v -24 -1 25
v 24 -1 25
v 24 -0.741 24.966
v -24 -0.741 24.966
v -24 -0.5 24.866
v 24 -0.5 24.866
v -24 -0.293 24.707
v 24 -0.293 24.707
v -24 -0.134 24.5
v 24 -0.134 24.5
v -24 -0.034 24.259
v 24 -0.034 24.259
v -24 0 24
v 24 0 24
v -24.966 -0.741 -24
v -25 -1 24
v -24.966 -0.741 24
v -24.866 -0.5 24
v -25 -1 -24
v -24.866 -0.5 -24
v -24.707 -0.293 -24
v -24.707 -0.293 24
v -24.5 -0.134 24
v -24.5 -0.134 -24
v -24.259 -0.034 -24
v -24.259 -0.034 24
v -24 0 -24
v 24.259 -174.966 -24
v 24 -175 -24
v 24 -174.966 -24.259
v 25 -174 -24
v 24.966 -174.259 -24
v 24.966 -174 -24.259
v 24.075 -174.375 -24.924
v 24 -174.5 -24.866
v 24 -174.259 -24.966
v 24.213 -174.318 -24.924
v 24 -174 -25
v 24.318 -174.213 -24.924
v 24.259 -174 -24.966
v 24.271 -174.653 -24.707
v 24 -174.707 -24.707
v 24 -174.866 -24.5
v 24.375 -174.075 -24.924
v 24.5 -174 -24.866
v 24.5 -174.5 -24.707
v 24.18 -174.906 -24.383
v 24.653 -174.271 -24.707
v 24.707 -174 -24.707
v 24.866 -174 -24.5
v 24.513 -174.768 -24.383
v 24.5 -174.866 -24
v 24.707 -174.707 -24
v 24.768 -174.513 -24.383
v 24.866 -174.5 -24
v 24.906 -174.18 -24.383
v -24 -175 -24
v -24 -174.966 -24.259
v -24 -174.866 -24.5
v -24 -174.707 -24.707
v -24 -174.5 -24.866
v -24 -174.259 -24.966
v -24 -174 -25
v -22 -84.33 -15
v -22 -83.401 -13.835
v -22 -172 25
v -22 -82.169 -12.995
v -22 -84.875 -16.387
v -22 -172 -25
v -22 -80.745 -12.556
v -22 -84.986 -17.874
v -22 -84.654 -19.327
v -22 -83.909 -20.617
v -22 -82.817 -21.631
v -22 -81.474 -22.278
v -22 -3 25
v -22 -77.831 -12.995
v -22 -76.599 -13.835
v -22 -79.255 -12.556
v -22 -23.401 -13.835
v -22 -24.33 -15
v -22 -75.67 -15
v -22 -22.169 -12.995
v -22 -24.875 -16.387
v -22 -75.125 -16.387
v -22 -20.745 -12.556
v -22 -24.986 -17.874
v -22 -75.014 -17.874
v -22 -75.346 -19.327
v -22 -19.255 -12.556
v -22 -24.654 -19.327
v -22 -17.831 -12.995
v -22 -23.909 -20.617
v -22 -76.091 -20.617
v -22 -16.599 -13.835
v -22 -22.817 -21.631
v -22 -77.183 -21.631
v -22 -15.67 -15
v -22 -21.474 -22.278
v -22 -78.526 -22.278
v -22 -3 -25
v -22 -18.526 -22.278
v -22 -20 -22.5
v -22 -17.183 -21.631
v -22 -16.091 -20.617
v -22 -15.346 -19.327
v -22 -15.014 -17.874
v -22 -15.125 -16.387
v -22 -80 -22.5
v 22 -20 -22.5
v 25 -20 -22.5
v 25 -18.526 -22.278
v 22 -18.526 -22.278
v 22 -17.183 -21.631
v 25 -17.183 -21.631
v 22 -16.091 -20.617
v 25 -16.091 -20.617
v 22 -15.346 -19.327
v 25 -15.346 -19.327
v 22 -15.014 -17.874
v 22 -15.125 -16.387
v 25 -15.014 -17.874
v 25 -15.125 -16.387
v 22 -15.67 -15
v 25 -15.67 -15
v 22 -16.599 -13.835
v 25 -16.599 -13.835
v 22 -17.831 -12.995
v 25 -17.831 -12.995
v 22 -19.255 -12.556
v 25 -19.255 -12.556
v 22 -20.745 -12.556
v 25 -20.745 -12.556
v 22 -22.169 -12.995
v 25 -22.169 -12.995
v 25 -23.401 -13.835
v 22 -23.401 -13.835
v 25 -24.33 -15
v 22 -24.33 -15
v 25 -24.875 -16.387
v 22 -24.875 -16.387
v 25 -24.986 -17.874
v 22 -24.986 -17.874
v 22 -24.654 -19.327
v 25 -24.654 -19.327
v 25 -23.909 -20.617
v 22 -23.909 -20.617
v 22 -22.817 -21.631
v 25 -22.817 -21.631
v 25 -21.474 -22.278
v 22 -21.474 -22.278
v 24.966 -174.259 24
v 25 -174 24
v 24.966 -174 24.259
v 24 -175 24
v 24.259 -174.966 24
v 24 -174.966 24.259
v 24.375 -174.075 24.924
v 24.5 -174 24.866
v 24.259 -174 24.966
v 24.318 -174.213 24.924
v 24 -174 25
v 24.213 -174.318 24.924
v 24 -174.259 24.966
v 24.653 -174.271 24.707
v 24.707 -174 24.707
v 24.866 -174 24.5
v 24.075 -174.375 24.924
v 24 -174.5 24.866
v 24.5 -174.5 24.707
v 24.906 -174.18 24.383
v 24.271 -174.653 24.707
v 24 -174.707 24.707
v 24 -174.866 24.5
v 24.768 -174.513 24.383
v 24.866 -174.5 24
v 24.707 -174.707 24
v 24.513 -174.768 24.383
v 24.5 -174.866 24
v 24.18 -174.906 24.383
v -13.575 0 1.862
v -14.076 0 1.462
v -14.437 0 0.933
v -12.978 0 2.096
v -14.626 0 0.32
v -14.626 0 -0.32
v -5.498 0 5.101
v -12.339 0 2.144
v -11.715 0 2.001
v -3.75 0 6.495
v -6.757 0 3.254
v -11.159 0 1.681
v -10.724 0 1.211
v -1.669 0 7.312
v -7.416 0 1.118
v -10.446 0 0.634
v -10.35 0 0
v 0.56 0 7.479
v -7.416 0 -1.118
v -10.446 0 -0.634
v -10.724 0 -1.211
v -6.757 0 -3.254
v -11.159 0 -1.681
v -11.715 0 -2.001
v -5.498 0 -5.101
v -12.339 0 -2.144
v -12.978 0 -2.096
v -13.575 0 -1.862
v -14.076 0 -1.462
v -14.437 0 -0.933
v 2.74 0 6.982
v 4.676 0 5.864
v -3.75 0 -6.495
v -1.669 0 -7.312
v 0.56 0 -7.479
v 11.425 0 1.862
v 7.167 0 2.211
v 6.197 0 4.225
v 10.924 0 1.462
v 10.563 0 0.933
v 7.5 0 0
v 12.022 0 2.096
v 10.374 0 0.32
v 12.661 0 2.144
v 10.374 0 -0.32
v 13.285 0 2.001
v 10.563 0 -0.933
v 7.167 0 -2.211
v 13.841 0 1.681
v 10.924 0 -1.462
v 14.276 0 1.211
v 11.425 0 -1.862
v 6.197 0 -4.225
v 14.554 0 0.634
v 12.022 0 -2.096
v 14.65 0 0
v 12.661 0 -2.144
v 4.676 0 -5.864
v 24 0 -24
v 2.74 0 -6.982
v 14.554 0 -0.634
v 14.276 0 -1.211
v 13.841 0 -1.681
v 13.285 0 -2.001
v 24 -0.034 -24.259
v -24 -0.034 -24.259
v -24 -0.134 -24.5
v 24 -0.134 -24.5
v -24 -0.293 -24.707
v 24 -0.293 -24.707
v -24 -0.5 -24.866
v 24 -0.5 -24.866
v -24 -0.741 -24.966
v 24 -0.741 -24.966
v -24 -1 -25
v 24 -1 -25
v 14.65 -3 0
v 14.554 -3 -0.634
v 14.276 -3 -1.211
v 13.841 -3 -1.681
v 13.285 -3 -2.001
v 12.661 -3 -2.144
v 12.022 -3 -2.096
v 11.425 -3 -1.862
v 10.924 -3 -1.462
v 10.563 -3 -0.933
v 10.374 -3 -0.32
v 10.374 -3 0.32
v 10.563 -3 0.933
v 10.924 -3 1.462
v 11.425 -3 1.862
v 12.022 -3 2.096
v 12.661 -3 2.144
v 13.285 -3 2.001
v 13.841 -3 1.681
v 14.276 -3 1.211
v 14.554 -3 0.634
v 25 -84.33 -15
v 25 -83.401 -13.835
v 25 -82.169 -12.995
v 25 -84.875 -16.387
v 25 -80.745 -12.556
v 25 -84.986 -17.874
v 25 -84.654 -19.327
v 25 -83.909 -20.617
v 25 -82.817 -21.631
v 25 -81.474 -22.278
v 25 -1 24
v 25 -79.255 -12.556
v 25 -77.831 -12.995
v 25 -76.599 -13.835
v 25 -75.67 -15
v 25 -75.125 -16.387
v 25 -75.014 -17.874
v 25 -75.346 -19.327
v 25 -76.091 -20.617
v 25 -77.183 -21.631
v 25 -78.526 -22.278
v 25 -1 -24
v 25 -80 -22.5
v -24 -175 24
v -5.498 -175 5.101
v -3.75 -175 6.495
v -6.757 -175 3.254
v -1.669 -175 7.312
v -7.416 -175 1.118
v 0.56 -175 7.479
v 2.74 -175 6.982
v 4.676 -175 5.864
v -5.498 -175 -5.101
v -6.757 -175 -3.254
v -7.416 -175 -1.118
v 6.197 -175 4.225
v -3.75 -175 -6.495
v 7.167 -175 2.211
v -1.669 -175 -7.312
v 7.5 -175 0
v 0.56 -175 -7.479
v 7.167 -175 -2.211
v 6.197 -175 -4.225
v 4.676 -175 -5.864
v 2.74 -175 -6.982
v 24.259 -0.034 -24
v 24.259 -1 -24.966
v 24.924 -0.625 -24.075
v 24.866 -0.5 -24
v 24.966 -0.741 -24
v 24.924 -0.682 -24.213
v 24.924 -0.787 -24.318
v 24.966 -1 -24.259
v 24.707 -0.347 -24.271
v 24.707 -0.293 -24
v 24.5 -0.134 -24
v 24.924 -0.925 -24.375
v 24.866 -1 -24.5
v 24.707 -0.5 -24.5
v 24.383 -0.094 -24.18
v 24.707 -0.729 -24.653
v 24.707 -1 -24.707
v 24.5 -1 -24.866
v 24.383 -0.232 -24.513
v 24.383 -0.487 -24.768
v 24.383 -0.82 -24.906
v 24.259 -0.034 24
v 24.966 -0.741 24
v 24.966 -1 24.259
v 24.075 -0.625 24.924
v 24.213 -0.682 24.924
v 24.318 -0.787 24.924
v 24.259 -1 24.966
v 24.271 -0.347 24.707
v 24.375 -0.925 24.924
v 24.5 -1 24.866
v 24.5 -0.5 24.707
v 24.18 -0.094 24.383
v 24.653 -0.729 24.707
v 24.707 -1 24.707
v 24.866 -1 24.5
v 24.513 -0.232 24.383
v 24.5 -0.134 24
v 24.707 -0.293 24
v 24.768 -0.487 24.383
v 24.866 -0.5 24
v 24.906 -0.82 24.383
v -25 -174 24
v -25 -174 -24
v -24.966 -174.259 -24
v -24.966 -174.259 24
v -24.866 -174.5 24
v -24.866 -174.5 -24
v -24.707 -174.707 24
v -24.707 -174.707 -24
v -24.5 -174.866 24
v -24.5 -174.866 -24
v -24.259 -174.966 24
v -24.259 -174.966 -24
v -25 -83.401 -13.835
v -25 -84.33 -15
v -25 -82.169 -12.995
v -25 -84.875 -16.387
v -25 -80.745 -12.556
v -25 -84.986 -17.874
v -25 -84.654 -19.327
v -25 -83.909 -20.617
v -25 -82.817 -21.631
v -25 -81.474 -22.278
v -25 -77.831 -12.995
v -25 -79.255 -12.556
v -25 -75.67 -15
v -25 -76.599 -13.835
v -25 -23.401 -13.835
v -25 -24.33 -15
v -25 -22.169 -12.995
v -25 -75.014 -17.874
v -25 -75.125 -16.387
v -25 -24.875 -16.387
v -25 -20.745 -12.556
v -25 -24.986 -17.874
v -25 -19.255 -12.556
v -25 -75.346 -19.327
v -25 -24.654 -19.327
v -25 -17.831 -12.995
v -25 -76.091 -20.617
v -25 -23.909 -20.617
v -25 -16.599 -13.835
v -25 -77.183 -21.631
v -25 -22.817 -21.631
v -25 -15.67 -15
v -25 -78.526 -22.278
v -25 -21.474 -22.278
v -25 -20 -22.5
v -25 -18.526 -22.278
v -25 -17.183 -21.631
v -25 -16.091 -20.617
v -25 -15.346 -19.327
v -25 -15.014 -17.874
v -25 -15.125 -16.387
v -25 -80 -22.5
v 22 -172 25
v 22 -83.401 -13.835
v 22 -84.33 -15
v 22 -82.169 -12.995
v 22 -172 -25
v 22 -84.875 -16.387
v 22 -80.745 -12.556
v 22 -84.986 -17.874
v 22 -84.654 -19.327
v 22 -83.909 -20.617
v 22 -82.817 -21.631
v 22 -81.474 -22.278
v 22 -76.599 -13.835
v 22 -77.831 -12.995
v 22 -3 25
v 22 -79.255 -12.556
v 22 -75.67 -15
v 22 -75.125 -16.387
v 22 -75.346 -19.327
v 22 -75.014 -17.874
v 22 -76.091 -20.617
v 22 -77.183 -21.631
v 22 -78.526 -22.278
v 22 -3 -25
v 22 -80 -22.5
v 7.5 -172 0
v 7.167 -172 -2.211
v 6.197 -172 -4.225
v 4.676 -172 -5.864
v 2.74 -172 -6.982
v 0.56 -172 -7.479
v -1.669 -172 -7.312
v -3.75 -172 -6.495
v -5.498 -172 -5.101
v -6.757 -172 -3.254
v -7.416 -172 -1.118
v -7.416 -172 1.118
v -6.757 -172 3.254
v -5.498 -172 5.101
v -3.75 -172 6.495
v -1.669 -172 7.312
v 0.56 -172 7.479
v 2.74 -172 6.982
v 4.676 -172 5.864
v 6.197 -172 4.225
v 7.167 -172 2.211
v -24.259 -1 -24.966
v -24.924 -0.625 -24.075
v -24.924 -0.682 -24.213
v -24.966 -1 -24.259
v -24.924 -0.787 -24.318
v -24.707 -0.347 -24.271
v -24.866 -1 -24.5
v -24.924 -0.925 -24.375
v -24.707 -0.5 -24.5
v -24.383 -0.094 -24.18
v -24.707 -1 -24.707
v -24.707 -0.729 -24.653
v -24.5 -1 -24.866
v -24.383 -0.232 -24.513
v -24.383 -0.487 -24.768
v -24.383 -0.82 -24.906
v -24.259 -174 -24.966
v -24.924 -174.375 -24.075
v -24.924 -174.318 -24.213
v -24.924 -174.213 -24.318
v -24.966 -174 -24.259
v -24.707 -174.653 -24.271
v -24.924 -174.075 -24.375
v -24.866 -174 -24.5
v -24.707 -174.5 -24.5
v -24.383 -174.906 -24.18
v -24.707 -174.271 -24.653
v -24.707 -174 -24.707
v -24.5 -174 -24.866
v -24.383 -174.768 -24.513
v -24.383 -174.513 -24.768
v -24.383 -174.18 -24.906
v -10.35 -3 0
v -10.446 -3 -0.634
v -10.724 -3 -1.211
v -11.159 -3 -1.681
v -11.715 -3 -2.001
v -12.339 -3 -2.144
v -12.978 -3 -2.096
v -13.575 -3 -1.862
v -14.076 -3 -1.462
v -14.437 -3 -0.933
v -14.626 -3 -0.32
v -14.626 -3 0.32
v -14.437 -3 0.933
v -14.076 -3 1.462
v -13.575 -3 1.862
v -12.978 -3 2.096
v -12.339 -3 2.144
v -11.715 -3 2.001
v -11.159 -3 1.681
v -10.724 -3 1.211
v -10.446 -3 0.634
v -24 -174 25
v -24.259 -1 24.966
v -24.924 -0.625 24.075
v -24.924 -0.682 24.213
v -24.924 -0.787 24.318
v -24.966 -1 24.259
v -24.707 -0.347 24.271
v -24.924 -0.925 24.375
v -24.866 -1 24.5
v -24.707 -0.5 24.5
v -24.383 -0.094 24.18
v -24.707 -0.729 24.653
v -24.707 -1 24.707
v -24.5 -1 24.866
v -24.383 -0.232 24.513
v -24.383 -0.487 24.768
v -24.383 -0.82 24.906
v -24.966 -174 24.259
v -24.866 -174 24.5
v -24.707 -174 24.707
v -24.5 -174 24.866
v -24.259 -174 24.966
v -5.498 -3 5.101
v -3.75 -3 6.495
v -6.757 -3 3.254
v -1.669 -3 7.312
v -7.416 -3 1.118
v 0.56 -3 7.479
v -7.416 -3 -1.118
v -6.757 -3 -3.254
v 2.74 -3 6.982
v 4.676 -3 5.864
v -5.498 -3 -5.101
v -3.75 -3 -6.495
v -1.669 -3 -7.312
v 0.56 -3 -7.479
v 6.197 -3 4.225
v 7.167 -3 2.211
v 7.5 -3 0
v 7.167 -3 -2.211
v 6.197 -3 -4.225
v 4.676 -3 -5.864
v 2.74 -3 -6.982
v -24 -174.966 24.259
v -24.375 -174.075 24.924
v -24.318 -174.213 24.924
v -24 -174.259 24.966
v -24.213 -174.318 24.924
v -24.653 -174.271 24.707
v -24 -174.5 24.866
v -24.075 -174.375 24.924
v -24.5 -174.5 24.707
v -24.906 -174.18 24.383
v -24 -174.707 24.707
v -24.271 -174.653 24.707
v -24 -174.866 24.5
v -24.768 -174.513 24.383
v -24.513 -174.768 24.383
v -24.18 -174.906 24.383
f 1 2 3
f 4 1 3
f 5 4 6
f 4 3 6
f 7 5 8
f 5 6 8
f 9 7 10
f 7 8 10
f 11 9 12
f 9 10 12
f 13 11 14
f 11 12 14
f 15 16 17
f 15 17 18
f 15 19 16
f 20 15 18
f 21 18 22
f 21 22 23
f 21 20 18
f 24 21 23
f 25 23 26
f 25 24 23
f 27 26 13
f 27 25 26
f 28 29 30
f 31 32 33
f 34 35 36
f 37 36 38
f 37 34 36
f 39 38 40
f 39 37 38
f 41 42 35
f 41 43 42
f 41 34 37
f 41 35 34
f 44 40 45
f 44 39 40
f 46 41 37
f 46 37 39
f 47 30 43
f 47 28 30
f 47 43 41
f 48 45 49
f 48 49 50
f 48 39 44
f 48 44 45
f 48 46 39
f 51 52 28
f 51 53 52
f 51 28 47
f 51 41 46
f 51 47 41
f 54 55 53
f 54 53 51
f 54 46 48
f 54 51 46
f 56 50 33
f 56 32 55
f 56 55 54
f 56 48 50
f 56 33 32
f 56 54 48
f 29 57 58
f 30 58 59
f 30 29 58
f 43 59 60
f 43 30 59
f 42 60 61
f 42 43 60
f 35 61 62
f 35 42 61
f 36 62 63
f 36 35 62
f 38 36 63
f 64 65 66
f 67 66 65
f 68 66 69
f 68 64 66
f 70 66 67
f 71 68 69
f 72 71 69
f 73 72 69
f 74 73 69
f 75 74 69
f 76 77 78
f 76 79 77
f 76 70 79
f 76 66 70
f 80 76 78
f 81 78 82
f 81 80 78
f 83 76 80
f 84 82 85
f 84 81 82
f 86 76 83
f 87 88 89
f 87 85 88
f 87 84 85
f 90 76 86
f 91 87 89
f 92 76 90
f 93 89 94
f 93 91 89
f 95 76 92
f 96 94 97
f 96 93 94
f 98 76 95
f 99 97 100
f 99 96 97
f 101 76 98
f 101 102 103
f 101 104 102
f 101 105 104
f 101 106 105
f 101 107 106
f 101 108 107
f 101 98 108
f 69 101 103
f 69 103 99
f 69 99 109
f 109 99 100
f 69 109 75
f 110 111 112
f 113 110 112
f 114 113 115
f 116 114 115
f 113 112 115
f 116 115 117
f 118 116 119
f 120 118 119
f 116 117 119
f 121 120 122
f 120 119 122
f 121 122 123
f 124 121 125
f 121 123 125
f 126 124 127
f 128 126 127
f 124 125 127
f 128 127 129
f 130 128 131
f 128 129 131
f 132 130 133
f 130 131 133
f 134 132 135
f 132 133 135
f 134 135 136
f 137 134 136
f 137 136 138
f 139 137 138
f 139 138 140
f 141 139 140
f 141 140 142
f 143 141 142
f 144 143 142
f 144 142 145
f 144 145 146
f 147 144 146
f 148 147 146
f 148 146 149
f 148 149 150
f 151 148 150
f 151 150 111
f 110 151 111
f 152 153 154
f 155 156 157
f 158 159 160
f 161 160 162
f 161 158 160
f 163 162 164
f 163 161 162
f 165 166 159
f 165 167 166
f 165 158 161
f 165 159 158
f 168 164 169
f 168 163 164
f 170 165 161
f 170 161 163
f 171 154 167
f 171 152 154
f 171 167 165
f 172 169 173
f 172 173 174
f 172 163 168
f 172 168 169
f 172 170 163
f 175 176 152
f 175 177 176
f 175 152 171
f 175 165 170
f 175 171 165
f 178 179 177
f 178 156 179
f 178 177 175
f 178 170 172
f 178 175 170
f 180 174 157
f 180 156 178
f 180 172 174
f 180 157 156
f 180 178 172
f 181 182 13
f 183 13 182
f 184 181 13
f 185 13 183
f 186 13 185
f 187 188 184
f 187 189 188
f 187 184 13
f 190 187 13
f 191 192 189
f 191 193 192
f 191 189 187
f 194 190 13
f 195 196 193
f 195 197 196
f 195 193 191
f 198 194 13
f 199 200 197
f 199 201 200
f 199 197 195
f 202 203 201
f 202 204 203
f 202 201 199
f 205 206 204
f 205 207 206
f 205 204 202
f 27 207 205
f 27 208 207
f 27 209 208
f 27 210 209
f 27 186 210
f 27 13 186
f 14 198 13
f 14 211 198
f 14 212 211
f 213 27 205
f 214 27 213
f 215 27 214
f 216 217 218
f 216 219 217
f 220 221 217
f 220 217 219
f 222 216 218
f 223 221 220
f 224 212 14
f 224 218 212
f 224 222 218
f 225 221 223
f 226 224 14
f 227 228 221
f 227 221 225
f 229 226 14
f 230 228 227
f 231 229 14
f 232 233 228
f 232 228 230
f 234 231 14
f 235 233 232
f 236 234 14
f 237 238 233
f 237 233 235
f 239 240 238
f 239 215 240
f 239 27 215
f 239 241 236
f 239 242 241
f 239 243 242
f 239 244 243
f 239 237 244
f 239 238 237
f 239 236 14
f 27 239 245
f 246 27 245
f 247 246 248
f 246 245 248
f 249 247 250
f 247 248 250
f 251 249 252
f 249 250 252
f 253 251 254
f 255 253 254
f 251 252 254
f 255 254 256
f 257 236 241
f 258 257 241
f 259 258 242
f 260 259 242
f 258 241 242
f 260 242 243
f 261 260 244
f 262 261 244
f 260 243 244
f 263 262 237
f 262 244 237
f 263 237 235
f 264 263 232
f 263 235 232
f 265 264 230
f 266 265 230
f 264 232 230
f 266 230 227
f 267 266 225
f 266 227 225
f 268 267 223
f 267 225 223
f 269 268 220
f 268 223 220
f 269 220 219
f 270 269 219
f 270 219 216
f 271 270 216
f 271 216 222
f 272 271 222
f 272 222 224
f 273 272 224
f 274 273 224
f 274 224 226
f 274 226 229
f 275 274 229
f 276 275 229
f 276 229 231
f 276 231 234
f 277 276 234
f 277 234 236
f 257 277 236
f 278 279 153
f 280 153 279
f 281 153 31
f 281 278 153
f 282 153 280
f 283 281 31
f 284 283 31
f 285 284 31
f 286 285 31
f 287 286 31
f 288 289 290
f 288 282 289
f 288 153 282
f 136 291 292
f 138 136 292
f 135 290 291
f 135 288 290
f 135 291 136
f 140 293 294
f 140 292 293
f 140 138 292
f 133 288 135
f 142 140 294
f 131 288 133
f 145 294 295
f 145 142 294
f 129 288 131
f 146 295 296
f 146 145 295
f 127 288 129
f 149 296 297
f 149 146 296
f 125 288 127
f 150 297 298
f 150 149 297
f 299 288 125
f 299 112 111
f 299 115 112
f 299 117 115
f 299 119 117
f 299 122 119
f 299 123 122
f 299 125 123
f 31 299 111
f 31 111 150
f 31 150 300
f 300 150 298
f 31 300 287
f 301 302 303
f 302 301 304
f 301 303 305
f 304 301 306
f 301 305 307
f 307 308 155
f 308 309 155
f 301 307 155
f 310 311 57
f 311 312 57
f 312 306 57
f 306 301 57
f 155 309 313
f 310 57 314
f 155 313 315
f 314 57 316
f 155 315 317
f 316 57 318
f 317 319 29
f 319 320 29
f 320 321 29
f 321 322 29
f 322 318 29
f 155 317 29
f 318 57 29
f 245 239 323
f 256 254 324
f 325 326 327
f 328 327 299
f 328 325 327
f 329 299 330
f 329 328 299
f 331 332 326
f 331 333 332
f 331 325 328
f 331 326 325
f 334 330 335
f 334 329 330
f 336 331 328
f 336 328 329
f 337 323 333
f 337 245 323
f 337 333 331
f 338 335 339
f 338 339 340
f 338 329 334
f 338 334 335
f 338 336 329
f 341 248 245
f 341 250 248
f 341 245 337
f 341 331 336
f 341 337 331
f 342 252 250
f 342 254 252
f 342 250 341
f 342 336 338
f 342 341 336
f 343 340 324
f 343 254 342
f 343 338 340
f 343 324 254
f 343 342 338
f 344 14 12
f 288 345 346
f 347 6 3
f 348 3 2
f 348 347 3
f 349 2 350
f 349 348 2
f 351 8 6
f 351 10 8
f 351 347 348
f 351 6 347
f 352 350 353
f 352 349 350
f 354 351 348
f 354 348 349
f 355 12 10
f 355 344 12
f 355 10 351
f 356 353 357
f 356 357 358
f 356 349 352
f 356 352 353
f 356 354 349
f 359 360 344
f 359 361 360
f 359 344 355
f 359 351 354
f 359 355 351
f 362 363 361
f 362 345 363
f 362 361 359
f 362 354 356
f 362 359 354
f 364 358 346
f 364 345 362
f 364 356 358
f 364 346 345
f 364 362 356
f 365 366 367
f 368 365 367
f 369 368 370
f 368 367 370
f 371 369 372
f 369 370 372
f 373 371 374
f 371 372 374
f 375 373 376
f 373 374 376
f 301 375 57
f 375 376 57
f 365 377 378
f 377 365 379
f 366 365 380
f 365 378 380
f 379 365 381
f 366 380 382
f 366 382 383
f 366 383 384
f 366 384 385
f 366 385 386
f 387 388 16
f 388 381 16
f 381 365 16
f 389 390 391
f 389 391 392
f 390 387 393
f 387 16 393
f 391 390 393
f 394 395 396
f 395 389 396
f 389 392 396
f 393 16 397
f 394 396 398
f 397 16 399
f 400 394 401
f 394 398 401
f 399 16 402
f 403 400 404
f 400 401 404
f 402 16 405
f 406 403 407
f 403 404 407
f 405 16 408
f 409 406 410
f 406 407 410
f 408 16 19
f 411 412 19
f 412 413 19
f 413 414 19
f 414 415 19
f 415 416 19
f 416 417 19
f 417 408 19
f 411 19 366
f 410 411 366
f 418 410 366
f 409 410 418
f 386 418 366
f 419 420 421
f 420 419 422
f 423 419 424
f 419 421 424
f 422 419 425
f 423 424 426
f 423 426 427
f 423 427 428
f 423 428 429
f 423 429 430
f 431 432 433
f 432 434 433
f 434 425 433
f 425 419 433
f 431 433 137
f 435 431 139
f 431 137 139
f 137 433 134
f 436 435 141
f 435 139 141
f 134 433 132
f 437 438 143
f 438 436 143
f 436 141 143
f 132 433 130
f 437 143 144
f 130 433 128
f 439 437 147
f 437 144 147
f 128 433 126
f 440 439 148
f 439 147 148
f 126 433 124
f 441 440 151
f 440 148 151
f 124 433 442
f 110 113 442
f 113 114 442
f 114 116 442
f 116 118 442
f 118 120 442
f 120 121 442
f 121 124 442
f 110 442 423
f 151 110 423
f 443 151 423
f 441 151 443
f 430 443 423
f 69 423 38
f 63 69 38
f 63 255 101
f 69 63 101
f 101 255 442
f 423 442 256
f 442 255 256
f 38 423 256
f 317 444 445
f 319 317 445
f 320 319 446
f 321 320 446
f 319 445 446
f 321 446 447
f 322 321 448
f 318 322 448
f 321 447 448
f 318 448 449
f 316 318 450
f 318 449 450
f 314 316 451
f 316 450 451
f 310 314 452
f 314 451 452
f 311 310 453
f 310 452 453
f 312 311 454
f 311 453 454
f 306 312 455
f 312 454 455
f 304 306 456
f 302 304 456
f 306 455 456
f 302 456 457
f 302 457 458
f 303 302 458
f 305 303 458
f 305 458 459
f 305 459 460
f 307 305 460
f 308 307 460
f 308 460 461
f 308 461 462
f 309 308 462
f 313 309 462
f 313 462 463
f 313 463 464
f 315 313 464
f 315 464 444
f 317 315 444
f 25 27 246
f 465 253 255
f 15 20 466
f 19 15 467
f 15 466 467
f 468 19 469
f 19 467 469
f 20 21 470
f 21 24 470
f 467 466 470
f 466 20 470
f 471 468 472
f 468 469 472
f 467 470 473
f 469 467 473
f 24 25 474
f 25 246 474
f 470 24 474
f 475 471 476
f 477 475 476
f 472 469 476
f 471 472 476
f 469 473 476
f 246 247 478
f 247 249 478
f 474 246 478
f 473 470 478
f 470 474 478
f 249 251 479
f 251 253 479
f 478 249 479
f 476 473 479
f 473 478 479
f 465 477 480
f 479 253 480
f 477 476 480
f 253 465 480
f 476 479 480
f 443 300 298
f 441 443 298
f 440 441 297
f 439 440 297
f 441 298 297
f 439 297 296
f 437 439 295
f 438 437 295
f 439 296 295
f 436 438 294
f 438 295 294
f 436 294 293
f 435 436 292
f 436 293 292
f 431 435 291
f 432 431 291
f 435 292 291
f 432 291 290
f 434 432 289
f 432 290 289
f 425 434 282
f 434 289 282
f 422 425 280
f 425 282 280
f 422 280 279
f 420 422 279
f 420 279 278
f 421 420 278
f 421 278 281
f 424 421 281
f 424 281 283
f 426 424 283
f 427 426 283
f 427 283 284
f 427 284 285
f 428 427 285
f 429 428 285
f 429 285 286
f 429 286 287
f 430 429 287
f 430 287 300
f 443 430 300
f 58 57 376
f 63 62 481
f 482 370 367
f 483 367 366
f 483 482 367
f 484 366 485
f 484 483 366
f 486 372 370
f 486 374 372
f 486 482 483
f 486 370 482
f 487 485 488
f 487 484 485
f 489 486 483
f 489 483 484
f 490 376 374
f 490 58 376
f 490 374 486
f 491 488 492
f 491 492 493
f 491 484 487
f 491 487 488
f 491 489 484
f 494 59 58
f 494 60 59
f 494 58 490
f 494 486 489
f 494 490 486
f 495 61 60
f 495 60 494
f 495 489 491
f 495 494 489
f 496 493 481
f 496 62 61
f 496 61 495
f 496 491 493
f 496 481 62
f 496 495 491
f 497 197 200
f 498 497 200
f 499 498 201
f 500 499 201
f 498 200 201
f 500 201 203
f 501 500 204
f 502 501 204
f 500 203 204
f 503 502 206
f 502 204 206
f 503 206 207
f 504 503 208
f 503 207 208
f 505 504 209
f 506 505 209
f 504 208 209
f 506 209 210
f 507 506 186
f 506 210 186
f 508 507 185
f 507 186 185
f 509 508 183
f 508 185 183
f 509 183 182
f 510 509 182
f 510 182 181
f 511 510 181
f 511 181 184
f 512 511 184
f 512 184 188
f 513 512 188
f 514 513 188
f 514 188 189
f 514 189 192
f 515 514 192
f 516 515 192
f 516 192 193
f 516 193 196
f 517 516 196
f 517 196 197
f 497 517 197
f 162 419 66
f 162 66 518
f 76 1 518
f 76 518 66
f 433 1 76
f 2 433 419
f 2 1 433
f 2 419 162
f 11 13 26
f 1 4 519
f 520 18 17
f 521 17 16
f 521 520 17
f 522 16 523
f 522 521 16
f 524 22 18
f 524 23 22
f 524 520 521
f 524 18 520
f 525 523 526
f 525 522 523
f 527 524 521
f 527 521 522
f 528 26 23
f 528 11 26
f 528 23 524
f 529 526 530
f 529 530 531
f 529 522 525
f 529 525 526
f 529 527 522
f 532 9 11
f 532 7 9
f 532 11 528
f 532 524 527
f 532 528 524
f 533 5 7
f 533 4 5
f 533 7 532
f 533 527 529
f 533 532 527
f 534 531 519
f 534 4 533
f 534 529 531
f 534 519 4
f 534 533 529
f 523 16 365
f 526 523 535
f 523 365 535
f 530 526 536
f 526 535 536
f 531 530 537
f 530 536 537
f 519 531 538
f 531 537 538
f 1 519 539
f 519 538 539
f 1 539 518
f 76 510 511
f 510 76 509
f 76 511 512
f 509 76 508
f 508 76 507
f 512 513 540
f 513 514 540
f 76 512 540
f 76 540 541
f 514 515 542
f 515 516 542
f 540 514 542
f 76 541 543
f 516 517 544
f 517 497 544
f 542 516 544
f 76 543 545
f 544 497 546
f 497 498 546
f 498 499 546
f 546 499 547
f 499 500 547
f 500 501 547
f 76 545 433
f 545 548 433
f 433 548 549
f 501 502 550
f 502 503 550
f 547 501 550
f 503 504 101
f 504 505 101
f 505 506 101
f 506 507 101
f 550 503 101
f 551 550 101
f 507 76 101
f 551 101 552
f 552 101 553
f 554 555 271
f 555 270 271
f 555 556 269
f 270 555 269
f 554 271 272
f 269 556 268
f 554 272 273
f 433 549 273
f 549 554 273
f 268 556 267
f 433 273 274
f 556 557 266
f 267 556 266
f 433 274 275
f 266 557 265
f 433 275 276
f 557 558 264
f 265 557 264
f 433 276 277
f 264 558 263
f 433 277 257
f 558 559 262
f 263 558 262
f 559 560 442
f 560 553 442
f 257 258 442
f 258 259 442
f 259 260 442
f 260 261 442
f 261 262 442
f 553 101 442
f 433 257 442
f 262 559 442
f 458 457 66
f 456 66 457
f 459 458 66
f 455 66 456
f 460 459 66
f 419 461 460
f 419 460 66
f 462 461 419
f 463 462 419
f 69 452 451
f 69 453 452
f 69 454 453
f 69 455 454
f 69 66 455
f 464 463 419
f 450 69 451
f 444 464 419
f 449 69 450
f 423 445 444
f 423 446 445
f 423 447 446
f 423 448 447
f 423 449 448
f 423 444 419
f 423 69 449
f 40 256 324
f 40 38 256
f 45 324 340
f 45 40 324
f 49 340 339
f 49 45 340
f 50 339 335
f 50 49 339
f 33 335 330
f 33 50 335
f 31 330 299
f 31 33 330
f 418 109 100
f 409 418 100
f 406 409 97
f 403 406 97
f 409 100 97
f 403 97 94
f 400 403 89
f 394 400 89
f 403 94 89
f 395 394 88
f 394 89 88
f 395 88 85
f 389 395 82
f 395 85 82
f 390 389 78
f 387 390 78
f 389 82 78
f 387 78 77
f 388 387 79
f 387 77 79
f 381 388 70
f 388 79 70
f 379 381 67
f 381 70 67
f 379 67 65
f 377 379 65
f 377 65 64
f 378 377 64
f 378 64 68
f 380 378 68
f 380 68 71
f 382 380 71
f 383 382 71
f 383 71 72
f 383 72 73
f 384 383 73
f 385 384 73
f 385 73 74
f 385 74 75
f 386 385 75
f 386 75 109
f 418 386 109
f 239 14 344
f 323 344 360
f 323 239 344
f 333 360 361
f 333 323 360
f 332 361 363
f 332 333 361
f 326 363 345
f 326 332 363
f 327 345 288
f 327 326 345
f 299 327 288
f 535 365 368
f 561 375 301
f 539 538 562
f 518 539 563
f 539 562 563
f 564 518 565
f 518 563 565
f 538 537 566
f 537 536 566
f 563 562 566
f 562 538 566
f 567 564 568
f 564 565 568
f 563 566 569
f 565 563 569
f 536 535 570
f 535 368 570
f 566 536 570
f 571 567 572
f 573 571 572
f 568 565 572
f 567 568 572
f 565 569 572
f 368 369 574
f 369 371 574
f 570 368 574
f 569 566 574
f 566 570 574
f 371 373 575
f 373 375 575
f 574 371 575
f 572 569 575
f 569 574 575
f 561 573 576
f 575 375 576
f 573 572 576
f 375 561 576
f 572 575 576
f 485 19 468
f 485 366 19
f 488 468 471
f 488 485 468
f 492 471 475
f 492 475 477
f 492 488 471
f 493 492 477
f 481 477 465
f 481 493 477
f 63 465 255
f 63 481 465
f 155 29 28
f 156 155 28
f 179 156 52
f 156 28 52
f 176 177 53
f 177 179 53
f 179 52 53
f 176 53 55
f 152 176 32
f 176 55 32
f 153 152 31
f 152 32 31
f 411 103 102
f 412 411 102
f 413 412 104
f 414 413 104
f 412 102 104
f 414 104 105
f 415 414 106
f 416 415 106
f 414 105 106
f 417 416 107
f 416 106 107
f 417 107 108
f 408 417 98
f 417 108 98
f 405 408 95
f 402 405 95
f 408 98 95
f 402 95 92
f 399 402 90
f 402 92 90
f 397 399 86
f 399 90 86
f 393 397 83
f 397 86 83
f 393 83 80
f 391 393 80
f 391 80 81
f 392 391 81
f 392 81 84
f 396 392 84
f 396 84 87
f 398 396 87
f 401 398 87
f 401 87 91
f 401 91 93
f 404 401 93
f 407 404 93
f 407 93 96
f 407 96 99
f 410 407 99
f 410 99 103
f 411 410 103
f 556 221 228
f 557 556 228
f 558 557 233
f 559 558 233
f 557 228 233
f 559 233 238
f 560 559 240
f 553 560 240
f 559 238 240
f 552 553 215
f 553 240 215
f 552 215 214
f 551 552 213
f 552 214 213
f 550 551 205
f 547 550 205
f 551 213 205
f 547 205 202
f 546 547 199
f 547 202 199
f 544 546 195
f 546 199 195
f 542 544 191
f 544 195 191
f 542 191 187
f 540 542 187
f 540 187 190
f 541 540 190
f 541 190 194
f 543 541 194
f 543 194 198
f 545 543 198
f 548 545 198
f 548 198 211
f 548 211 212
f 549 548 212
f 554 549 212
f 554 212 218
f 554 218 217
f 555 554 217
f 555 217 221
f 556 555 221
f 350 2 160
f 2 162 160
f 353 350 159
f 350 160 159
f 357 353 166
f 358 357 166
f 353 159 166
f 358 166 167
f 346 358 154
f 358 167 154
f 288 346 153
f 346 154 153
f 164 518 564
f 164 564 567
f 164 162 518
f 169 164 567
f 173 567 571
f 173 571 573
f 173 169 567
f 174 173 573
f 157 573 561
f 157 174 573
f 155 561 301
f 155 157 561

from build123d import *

# Parameters (mm, degrees)
SKETCH1_W           = 50
SKETCH1_H           = 50
BOSS_EXTRUDE1_DEPTH = 175
SHELL1_T            = -3
CUT_EXTRUDE1_REACH  = 180.536
SKETCH2_R           = 7.5
SKETCH2_R_2         = 2.15
SKETCH2_2_R         = 7.5
CUT_EXTRUDE2_DEPTH  = 179.535710714
SKETCH3_R           = 5
CUT_EXTRUDE3_DEPTH  = 184.711730709
FILLET1_R           = 1


with BuildPart() as part:
    # Sketch1 → Boss-Extrude1 (new body)
    with BuildSketch(Plane(origin=(0, 0, 0), x_dir=(1, 0, 0), z_dir=(0, 1, 0))):
        Rectangle(SKETCH1_W, SKETCH1_H)
    extrude(amount=-BOSS_EXTRUDE1_DEPTH)

    # Shell1
    shell1_openings = [part.faces().sort_by_distance(p)[0] for p in [
        (0, -87.5, -25),
        (0, -87.5, 25),
    ]]
    offset(amount=SHELL1_T, openings=shell1_openings, kind=Kind.INTERSECTION)

    # Sketch2 → Cut-Extrude1 (cut, up to next)
    with BuildSketch(Plane(origin=(0, 0, 0), x_dir=(1, 0, 0), z_dir=(0, 1, 0)), mode=Mode.PRIVATE) as cut_extrude1_sk1:
        Circle(SKETCH2_R)
    cut_extrude1_tool1 = extrude(cut_extrude1_sk1.sketch, amount=-CUT_EXTRUDE1_REACH, mode=Mode.PRIVATE) & part.part
    # Sketch2 → Cut-Extrude1 (cut, up to next)
    with BuildSketch(Plane(origin=(0, 0, 0), x_dir=(1, 0, 0), z_dir=(0, 1, 0)), mode=Mode.PRIVATE) as cut_extrude1_sk2:
        with Locations((-12.5, 0)):
            Circle(SKETCH2_R_2)
    cut_extrude1_tool2 = extrude(cut_extrude1_sk2.sketch, amount=-CUT_EXTRUDE1_REACH, mode=Mode.PRIVATE) & part.part
    # Sketch2 → Cut-Extrude1 (cut, up to next)
    with BuildSketch(Plane(origin=(0, 0, 0), x_dir=(1, 0, 0), z_dir=(0, 1, 0)), mode=Mode.PRIVATE) as cut_extrude1_sk3:
        with Locations((12.5, 0)):
            Circle(SKETCH2_R_2)
    cut_extrude1_tool3 = extrude(cut_extrude1_sk3.sketch, amount=-CUT_EXTRUDE1_REACH, mode=Mode.PRIVATE) & part.part
    add(cut_extrude1_tool1.solids().sort_by_distance((0, 0, 0))[0], mode=Mode.SUBTRACT)
    add(cut_extrude1_tool2.solids().sort_by_distance((-12.5, 0, 0))[0], mode=Mode.SUBTRACT)
    add(cut_extrude1_tool3.solids().sort_by_distance((12.5, 0, 0))[0], mode=Mode.SUBTRACT)

    # Sketch2<2> → Cut-Extrude2 (cut, through all)
    with BuildSketch(Plane(origin=(0, 0, 0), x_dir=(1, 0, 0), z_dir=(0, 1, 0))):
        Circle(SKETCH2_2_R)
    extrude(amount=-CUT_EXTRUDE2_DEPTH, mode=Mode.SUBTRACT)

    # Sketch3 → Cut-Extrude3 (cut, through all)
    with BuildSketch(Plane(origin=(25, 0, 0), x_dir=(0, 0, -1), z_dir=(1, 0, 0))):
        with Locations((17.5, -20)):
            Circle(SKETCH3_R)
        with Locations((17.5, -80)):
            Circle(SKETCH3_R)
    extrude(amount=-CUT_EXTRUDE3_DEPTH, mode=Mode.SUBTRACT)

    # Fillet1
    fillet1_edges = [part.edges().sort_by_distance(p)[0] for p in [
        (-25, -175, 0),
        (0, -175, -25),
        (25, -175, 0),
        (0, -175, 25),
        (25, -87.5, -25),
        (0, 0, -25),
        (-25, -87.5, -25),
        (-25, 0, 0),
        (-25, -87.5, 25),
        (25, -87.5, 25),
        (0, 0, 25),
        (25, 0, 0),
    ]]
    fillet(fillet1_edges, radius=FILLET1_R)


solid = part.part
